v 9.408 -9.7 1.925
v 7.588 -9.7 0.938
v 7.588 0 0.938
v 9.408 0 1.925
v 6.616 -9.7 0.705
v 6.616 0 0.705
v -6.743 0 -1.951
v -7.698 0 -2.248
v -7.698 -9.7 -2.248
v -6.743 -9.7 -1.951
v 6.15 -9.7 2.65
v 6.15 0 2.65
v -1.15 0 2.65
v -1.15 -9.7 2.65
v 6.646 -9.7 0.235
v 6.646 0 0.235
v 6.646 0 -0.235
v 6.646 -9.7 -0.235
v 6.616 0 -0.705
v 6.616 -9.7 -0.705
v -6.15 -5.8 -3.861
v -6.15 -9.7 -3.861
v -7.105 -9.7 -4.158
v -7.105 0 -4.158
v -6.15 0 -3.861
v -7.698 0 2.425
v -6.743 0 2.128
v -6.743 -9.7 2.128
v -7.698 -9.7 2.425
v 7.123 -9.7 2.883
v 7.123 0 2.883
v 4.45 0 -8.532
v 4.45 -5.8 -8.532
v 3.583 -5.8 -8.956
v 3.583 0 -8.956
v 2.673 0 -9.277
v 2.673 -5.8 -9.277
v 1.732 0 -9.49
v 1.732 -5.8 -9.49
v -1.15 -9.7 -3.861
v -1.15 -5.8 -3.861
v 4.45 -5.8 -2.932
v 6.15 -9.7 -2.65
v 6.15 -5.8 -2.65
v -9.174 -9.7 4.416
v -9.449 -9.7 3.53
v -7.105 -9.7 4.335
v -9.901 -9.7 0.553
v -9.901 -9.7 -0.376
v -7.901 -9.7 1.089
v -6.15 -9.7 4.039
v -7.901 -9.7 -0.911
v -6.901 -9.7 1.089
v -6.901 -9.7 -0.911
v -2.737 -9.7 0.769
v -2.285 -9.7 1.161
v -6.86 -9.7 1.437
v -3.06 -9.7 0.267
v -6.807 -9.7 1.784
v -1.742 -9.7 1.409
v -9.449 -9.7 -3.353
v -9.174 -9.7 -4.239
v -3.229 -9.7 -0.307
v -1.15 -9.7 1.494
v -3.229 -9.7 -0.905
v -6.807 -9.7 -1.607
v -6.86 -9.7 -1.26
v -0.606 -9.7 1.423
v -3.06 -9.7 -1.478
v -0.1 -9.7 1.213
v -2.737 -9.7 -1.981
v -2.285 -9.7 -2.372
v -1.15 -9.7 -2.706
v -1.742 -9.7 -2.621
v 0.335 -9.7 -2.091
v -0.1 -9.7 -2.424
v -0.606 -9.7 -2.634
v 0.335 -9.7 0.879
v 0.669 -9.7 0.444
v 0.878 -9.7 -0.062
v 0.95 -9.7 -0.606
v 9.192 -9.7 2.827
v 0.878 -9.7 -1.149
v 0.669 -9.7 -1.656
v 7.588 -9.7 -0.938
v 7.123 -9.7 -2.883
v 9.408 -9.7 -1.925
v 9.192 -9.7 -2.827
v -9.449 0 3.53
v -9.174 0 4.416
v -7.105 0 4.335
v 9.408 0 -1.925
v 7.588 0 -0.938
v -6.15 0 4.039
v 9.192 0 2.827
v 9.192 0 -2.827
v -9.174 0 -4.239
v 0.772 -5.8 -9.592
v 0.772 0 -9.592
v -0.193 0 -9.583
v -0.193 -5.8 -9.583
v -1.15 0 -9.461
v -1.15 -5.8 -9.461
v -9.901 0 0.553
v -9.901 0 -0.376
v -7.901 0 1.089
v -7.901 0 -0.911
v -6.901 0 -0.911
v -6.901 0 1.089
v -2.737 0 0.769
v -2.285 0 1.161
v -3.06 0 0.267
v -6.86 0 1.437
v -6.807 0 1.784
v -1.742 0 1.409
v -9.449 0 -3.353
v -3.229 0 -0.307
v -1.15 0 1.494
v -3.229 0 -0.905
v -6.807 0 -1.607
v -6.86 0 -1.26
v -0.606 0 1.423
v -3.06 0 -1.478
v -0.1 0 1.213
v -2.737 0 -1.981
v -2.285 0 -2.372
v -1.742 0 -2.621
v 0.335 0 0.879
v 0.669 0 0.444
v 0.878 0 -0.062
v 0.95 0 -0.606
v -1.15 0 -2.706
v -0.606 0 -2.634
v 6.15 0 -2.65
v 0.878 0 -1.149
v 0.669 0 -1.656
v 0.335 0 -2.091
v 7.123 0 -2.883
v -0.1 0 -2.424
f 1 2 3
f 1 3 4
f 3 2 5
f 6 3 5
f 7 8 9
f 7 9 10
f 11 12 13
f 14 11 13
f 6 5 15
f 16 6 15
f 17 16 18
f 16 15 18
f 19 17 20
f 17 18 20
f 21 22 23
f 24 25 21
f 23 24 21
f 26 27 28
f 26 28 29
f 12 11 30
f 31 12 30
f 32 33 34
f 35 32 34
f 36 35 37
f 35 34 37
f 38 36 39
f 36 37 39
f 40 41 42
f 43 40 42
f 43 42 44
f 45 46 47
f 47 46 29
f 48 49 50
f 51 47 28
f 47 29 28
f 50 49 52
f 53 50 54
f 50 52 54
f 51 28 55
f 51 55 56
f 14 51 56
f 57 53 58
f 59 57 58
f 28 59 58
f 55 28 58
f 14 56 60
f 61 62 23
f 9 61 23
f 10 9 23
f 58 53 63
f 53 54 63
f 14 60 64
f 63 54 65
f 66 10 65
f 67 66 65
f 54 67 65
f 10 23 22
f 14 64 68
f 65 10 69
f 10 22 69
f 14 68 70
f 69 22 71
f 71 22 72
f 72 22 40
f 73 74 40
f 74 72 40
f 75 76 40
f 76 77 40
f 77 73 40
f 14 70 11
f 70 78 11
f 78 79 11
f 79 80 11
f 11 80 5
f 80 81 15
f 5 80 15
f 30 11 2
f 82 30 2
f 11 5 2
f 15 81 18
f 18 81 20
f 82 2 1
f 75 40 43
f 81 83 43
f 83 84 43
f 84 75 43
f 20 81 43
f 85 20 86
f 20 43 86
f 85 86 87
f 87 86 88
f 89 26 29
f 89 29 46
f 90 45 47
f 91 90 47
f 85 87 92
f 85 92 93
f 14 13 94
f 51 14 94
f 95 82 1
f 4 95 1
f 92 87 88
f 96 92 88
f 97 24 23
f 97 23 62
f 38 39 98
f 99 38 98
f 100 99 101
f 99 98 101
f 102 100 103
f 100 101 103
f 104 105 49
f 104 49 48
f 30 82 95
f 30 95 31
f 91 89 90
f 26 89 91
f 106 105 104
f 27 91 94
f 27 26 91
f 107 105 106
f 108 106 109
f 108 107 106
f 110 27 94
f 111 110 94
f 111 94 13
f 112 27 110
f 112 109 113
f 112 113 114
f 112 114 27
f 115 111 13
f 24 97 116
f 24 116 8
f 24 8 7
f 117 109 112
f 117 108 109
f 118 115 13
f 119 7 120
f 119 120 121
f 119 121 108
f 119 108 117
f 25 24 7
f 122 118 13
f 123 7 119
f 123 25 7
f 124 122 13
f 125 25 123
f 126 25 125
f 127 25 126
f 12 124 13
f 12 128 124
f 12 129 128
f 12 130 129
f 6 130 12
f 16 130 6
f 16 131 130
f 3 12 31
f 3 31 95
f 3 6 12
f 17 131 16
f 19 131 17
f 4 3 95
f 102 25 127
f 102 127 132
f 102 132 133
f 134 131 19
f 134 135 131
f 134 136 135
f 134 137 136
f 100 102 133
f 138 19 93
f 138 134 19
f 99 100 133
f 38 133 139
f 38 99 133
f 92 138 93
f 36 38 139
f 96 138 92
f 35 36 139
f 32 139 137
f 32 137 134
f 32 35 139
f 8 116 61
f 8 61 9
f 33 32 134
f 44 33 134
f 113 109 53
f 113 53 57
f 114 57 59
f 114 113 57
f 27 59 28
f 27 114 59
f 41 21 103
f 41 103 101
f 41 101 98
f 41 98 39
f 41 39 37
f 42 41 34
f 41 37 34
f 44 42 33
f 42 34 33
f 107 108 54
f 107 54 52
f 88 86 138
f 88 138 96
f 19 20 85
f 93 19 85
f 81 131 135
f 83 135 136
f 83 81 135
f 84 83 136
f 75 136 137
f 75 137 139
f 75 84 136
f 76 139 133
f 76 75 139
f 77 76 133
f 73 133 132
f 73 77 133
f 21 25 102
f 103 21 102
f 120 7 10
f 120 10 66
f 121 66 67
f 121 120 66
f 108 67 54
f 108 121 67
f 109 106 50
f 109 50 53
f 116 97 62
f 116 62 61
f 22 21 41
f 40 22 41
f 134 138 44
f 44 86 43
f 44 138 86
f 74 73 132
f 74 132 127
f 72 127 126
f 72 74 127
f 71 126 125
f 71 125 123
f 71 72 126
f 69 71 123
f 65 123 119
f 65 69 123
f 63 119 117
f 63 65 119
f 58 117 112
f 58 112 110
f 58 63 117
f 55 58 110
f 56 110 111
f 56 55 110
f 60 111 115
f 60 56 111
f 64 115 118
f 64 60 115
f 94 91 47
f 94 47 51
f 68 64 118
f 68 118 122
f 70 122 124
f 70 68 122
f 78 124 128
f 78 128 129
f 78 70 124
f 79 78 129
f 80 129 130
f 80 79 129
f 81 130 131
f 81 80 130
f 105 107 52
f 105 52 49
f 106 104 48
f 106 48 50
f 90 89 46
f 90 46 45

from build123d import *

# Parameters (mm, degrees)
BOSS_EXTRUDE1_DEPTH = 9.7
BOSS_EXTRUDE2_DEPTH = 5.8
CUT_EXTRUDE1_DEPTH  = 15.880557968
BOSS_EXTRUDE3_REACH = 16.881
CUT_EXTRUDE2_DEPTH  = 17.567792011
BOSS_EXTRUDE4_START = -9.7
BOSS_EXTRUDE4_DEPTH = 9.7
BOSS_EXTRUDE5_DEPTH = 5.8


# Read off the part's stored shape, not the designer's step: Boss-Extrude4
with BuildPart() as part:
    # Sketch1 → Boss-Extrude1 (new body)
    with BuildSketch(Plane(origin=(0, 0, 0), x_dir=(1, 0, 0), z_dir=(0, 1, 0))):
        Polygon((6.15, 2.65), (6.15, -2.65), (-1.15, -2.65), (-6.15, -4.038578044), (-6.15, 3.861421956), (-1.15, 3.861421956), align=None)
    extrude(amount=BOSS_EXTRUDE1_DEPTH)

    # Sketch2 → Boss-Extrude2 (add)
    with BuildSketch(Plane.XZ):
        Polygon((-6.15, -3.861421956), (-1.15, -9.461421956), (-1.15, -3.861421956), align=None)
        Polygon((-1.15, -3.861421956), (-1.15, -9.461421956), (4.45, -8.532111962), (4.45, -2.932111962), align=None)
        Polygon((4.45, -2.932111962), (4.45, -8.532111962), (6.15, -2.65), align=None)
    extrude(amount=-BOSS_EXTRUDE2_DEPTH)

    # Sketch3 → Cut-Extrude1 (cut, through all)
    with BuildSketch(Plane(origin=(0, 9.7, 0), x_dir=(1, 0, 0), z_dir=(0, 1, 0))):
        with BuildLine():
            ThreePointArc((0.95, 0.605710978), (0.33492424, 2.090635219), (-1.15, 2.705710978))
            Line((-1.15, 2.705710978), (-1.15, -1.494289022))
            ThreePointArc((-1.15, -1.494289022), (0.33492424, -0.879213262), (0.95, 0.605710978))
        make_face()
        with BuildLine():
            Line((-1.15, -1.494289022), (-1.15, 2.705710978))
            ThreePointArc((-1.15, 2.705710978), (-3.25, 0.605710978), (-1.15, -1.494289022))
        make_face()
    extrude(amount=-CUT_EXTRUDE1_DEPTH, mode=Mode.SUBTRACT)

    # Boss-Extrude3: up to this face of the body (flat: up to its plane)
    boss_extrude3_end = Plane(part.part.faces().sort_by_distance((0.174384558, 0, -2.694350329))[0])
    # Sketch4 → Boss-Extrude3 (add, up to the picked face)
    with BuildSketch(Plane(origin=(0, 9.7, 0), x_dir=(1, 0, 0), z_dir=(0, 1, 0)), mode=Mode.PRIVATE) as boss_extrude3_sk1:
        with BuildLine():
            Line((6.615749123, 0.704986439), (9.533269465, 1.403610124))
            Line((9.533269465, 1.403610124), (9.067520342, 3.348623685))
            Line((9.067520342, 3.348623685), (6.15, 2.65))
            Line((6.15, 2.65), (6.15, -2.65))
            Line((6.15, -2.65), (9.067520342, -3.348623685))
            Line((9.067520342, -3.348623685), (9.533269465, -1.403610124))
            Line((9.533269465, -1.403610124), (6.615749123, -0.704986439))
            ThreePointArc((6.615749123, -0.704986439), (6.65, 0), (6.615749123, 0.704986439))
        make_face()
    boss_extrude3_tool1 = split(extrude(boss_extrude3_sk1.sketch, amount=-BOSS_EXTRUDE3_REACH, mode=Mode.PRIVATE), bisect_by=boss_extrude3_end, keep=Keep.BOTH, mode=Mode.PRIVATE)
    add(boss_extrude3_tool1.solids().sort_by(Axis((6.574967, 9.7, 0), (0, -1, 0)))[0])

    # Sketch5 → Cut-Extrude2 (cut, through all)
    with BuildSketch(Plane(origin=(0, 9.7, 0), x_dir=(1, 0, 0), z_dir=(0, 1, 0))):
        Polygon((9.067520342, 3.348623685), (7.122506781, 2.882874562), (9.192317444, 2.827458872), align=None)
        Polygon((9.408472364, 1.924774937), (7.588255904, 0.937861), (9.533269465, 1.403610124), align=None)
        Polygon((9.408472364, -1.924774937), (9.533269465, -1.403610124), (7.588255904, -0.937861), align=None)
        Polygon((9.192317444, -2.827458872), (7.122506781, -2.882874562), (9.067520342, -3.348623685), align=None)
    extrude(amount=-CUT_EXTRUDE2_DEPTH, mode=Mode.SUBTRACT)

    # Boss-Extrude4 outline → Boss-Extrude4 (add)
    with BuildSketch(Plane(origin=(0, 9.7, 0), x_dir=(1, 0, 0), z_dir=(0, 1, 0)).offset(BOSS_EXTRUDE4_START)):
        with BuildLine():
            Line((-6.900626431, 0.911421956), (-7.900631816, 0.911421956))
            Line((-7.900631816, 0.911421956), (-9.900626719, 0.375520635))
            Line((-9.900626719, 0.375520635), (-9.900626431, -0.552684328))
            Line((-9.900626431, -0.552684328), (-7.900627802, -1.088578044))
            Line((-7.900627802, -1.088578044), (-6.900626431, -1.088578044))
            ThreePointArc((-6.900626431, -1.088578044), (-6.835256527, -1.610578376), (-6.742932214, -2.128491295))
            Line((-6.742932214, -2.128491295), (-7.697979422, -2.424958592))
            Line((-7.697979422, -2.424958592), (-9.449184507, -3.529703076))
            Line((-9.449184507, -3.529703076), (-9.1740036, -4.416177353))
            Line((-9.1740036, -4.416177353), (-7.105039542, -4.335042961))
            Line((-7.105039542, -4.335042961), (-6.15, -4.038578044))
            Line((-6.15, -4.038578044), (-6.15, 3.861421956))
            Line((-6.15, 3.861421956), (-7.105043375, 4.157888063))
            Line((-7.105043375, 4.157888063), (-9.174005832, 4.239014076))
            Line((-9.174005832, 4.239014076), (-9.44918663, 3.35253973))
            Line((-9.44918663, 3.35253973), (-7.697975589, 2.247801314))
            Line((-7.697975589, 2.247801314), (-6.742932214, 1.951335207))
            ThreePointArc((-6.742932214, 1.951335207), (-6.835256527, 1.433422288), (-6.900626431, 0.911421956))
        make_face()
    extrude(amount=BOSS_EXTRUDE4_DEPTH)

    # Sketch8 → Boss-Extrude5 (add)
    with BuildSketch(Plane(origin=(0, 5.8, 0), x_dir=(1, 0, 0), z_dir=(0, 1, 0))):
        with BuildLine():
            ThreePointArc((1.731854671, 9.490021268), (0.289677429, 9.601670434), (-1.15, 9.461421956))
            Line((-1.15, 9.461421956), (1.65, 8.996766959))
            Line((1.65, 8.996766959), (1.731854671, 9.490021268))
        make_face()
        with BuildLine():
            Line((1.731854671, 9.490021268), (1.65, 8.996766959))
            Line((1.65, 8.996766959), (4.45, 8.532111962))
            ThreePointArc((4.45, 8.532111962), (3.132791885, 9.12986067), (1.731854671, 9.490021268))
        make_face()
    extrude(amount=-BOSS_EXTRUDE5_DEPTH)


with BuildPart() as body_2:
    # Mirror1: mirrored copy
    add(part.part.mirror(Plane.ZX))


solid = body_2.part
